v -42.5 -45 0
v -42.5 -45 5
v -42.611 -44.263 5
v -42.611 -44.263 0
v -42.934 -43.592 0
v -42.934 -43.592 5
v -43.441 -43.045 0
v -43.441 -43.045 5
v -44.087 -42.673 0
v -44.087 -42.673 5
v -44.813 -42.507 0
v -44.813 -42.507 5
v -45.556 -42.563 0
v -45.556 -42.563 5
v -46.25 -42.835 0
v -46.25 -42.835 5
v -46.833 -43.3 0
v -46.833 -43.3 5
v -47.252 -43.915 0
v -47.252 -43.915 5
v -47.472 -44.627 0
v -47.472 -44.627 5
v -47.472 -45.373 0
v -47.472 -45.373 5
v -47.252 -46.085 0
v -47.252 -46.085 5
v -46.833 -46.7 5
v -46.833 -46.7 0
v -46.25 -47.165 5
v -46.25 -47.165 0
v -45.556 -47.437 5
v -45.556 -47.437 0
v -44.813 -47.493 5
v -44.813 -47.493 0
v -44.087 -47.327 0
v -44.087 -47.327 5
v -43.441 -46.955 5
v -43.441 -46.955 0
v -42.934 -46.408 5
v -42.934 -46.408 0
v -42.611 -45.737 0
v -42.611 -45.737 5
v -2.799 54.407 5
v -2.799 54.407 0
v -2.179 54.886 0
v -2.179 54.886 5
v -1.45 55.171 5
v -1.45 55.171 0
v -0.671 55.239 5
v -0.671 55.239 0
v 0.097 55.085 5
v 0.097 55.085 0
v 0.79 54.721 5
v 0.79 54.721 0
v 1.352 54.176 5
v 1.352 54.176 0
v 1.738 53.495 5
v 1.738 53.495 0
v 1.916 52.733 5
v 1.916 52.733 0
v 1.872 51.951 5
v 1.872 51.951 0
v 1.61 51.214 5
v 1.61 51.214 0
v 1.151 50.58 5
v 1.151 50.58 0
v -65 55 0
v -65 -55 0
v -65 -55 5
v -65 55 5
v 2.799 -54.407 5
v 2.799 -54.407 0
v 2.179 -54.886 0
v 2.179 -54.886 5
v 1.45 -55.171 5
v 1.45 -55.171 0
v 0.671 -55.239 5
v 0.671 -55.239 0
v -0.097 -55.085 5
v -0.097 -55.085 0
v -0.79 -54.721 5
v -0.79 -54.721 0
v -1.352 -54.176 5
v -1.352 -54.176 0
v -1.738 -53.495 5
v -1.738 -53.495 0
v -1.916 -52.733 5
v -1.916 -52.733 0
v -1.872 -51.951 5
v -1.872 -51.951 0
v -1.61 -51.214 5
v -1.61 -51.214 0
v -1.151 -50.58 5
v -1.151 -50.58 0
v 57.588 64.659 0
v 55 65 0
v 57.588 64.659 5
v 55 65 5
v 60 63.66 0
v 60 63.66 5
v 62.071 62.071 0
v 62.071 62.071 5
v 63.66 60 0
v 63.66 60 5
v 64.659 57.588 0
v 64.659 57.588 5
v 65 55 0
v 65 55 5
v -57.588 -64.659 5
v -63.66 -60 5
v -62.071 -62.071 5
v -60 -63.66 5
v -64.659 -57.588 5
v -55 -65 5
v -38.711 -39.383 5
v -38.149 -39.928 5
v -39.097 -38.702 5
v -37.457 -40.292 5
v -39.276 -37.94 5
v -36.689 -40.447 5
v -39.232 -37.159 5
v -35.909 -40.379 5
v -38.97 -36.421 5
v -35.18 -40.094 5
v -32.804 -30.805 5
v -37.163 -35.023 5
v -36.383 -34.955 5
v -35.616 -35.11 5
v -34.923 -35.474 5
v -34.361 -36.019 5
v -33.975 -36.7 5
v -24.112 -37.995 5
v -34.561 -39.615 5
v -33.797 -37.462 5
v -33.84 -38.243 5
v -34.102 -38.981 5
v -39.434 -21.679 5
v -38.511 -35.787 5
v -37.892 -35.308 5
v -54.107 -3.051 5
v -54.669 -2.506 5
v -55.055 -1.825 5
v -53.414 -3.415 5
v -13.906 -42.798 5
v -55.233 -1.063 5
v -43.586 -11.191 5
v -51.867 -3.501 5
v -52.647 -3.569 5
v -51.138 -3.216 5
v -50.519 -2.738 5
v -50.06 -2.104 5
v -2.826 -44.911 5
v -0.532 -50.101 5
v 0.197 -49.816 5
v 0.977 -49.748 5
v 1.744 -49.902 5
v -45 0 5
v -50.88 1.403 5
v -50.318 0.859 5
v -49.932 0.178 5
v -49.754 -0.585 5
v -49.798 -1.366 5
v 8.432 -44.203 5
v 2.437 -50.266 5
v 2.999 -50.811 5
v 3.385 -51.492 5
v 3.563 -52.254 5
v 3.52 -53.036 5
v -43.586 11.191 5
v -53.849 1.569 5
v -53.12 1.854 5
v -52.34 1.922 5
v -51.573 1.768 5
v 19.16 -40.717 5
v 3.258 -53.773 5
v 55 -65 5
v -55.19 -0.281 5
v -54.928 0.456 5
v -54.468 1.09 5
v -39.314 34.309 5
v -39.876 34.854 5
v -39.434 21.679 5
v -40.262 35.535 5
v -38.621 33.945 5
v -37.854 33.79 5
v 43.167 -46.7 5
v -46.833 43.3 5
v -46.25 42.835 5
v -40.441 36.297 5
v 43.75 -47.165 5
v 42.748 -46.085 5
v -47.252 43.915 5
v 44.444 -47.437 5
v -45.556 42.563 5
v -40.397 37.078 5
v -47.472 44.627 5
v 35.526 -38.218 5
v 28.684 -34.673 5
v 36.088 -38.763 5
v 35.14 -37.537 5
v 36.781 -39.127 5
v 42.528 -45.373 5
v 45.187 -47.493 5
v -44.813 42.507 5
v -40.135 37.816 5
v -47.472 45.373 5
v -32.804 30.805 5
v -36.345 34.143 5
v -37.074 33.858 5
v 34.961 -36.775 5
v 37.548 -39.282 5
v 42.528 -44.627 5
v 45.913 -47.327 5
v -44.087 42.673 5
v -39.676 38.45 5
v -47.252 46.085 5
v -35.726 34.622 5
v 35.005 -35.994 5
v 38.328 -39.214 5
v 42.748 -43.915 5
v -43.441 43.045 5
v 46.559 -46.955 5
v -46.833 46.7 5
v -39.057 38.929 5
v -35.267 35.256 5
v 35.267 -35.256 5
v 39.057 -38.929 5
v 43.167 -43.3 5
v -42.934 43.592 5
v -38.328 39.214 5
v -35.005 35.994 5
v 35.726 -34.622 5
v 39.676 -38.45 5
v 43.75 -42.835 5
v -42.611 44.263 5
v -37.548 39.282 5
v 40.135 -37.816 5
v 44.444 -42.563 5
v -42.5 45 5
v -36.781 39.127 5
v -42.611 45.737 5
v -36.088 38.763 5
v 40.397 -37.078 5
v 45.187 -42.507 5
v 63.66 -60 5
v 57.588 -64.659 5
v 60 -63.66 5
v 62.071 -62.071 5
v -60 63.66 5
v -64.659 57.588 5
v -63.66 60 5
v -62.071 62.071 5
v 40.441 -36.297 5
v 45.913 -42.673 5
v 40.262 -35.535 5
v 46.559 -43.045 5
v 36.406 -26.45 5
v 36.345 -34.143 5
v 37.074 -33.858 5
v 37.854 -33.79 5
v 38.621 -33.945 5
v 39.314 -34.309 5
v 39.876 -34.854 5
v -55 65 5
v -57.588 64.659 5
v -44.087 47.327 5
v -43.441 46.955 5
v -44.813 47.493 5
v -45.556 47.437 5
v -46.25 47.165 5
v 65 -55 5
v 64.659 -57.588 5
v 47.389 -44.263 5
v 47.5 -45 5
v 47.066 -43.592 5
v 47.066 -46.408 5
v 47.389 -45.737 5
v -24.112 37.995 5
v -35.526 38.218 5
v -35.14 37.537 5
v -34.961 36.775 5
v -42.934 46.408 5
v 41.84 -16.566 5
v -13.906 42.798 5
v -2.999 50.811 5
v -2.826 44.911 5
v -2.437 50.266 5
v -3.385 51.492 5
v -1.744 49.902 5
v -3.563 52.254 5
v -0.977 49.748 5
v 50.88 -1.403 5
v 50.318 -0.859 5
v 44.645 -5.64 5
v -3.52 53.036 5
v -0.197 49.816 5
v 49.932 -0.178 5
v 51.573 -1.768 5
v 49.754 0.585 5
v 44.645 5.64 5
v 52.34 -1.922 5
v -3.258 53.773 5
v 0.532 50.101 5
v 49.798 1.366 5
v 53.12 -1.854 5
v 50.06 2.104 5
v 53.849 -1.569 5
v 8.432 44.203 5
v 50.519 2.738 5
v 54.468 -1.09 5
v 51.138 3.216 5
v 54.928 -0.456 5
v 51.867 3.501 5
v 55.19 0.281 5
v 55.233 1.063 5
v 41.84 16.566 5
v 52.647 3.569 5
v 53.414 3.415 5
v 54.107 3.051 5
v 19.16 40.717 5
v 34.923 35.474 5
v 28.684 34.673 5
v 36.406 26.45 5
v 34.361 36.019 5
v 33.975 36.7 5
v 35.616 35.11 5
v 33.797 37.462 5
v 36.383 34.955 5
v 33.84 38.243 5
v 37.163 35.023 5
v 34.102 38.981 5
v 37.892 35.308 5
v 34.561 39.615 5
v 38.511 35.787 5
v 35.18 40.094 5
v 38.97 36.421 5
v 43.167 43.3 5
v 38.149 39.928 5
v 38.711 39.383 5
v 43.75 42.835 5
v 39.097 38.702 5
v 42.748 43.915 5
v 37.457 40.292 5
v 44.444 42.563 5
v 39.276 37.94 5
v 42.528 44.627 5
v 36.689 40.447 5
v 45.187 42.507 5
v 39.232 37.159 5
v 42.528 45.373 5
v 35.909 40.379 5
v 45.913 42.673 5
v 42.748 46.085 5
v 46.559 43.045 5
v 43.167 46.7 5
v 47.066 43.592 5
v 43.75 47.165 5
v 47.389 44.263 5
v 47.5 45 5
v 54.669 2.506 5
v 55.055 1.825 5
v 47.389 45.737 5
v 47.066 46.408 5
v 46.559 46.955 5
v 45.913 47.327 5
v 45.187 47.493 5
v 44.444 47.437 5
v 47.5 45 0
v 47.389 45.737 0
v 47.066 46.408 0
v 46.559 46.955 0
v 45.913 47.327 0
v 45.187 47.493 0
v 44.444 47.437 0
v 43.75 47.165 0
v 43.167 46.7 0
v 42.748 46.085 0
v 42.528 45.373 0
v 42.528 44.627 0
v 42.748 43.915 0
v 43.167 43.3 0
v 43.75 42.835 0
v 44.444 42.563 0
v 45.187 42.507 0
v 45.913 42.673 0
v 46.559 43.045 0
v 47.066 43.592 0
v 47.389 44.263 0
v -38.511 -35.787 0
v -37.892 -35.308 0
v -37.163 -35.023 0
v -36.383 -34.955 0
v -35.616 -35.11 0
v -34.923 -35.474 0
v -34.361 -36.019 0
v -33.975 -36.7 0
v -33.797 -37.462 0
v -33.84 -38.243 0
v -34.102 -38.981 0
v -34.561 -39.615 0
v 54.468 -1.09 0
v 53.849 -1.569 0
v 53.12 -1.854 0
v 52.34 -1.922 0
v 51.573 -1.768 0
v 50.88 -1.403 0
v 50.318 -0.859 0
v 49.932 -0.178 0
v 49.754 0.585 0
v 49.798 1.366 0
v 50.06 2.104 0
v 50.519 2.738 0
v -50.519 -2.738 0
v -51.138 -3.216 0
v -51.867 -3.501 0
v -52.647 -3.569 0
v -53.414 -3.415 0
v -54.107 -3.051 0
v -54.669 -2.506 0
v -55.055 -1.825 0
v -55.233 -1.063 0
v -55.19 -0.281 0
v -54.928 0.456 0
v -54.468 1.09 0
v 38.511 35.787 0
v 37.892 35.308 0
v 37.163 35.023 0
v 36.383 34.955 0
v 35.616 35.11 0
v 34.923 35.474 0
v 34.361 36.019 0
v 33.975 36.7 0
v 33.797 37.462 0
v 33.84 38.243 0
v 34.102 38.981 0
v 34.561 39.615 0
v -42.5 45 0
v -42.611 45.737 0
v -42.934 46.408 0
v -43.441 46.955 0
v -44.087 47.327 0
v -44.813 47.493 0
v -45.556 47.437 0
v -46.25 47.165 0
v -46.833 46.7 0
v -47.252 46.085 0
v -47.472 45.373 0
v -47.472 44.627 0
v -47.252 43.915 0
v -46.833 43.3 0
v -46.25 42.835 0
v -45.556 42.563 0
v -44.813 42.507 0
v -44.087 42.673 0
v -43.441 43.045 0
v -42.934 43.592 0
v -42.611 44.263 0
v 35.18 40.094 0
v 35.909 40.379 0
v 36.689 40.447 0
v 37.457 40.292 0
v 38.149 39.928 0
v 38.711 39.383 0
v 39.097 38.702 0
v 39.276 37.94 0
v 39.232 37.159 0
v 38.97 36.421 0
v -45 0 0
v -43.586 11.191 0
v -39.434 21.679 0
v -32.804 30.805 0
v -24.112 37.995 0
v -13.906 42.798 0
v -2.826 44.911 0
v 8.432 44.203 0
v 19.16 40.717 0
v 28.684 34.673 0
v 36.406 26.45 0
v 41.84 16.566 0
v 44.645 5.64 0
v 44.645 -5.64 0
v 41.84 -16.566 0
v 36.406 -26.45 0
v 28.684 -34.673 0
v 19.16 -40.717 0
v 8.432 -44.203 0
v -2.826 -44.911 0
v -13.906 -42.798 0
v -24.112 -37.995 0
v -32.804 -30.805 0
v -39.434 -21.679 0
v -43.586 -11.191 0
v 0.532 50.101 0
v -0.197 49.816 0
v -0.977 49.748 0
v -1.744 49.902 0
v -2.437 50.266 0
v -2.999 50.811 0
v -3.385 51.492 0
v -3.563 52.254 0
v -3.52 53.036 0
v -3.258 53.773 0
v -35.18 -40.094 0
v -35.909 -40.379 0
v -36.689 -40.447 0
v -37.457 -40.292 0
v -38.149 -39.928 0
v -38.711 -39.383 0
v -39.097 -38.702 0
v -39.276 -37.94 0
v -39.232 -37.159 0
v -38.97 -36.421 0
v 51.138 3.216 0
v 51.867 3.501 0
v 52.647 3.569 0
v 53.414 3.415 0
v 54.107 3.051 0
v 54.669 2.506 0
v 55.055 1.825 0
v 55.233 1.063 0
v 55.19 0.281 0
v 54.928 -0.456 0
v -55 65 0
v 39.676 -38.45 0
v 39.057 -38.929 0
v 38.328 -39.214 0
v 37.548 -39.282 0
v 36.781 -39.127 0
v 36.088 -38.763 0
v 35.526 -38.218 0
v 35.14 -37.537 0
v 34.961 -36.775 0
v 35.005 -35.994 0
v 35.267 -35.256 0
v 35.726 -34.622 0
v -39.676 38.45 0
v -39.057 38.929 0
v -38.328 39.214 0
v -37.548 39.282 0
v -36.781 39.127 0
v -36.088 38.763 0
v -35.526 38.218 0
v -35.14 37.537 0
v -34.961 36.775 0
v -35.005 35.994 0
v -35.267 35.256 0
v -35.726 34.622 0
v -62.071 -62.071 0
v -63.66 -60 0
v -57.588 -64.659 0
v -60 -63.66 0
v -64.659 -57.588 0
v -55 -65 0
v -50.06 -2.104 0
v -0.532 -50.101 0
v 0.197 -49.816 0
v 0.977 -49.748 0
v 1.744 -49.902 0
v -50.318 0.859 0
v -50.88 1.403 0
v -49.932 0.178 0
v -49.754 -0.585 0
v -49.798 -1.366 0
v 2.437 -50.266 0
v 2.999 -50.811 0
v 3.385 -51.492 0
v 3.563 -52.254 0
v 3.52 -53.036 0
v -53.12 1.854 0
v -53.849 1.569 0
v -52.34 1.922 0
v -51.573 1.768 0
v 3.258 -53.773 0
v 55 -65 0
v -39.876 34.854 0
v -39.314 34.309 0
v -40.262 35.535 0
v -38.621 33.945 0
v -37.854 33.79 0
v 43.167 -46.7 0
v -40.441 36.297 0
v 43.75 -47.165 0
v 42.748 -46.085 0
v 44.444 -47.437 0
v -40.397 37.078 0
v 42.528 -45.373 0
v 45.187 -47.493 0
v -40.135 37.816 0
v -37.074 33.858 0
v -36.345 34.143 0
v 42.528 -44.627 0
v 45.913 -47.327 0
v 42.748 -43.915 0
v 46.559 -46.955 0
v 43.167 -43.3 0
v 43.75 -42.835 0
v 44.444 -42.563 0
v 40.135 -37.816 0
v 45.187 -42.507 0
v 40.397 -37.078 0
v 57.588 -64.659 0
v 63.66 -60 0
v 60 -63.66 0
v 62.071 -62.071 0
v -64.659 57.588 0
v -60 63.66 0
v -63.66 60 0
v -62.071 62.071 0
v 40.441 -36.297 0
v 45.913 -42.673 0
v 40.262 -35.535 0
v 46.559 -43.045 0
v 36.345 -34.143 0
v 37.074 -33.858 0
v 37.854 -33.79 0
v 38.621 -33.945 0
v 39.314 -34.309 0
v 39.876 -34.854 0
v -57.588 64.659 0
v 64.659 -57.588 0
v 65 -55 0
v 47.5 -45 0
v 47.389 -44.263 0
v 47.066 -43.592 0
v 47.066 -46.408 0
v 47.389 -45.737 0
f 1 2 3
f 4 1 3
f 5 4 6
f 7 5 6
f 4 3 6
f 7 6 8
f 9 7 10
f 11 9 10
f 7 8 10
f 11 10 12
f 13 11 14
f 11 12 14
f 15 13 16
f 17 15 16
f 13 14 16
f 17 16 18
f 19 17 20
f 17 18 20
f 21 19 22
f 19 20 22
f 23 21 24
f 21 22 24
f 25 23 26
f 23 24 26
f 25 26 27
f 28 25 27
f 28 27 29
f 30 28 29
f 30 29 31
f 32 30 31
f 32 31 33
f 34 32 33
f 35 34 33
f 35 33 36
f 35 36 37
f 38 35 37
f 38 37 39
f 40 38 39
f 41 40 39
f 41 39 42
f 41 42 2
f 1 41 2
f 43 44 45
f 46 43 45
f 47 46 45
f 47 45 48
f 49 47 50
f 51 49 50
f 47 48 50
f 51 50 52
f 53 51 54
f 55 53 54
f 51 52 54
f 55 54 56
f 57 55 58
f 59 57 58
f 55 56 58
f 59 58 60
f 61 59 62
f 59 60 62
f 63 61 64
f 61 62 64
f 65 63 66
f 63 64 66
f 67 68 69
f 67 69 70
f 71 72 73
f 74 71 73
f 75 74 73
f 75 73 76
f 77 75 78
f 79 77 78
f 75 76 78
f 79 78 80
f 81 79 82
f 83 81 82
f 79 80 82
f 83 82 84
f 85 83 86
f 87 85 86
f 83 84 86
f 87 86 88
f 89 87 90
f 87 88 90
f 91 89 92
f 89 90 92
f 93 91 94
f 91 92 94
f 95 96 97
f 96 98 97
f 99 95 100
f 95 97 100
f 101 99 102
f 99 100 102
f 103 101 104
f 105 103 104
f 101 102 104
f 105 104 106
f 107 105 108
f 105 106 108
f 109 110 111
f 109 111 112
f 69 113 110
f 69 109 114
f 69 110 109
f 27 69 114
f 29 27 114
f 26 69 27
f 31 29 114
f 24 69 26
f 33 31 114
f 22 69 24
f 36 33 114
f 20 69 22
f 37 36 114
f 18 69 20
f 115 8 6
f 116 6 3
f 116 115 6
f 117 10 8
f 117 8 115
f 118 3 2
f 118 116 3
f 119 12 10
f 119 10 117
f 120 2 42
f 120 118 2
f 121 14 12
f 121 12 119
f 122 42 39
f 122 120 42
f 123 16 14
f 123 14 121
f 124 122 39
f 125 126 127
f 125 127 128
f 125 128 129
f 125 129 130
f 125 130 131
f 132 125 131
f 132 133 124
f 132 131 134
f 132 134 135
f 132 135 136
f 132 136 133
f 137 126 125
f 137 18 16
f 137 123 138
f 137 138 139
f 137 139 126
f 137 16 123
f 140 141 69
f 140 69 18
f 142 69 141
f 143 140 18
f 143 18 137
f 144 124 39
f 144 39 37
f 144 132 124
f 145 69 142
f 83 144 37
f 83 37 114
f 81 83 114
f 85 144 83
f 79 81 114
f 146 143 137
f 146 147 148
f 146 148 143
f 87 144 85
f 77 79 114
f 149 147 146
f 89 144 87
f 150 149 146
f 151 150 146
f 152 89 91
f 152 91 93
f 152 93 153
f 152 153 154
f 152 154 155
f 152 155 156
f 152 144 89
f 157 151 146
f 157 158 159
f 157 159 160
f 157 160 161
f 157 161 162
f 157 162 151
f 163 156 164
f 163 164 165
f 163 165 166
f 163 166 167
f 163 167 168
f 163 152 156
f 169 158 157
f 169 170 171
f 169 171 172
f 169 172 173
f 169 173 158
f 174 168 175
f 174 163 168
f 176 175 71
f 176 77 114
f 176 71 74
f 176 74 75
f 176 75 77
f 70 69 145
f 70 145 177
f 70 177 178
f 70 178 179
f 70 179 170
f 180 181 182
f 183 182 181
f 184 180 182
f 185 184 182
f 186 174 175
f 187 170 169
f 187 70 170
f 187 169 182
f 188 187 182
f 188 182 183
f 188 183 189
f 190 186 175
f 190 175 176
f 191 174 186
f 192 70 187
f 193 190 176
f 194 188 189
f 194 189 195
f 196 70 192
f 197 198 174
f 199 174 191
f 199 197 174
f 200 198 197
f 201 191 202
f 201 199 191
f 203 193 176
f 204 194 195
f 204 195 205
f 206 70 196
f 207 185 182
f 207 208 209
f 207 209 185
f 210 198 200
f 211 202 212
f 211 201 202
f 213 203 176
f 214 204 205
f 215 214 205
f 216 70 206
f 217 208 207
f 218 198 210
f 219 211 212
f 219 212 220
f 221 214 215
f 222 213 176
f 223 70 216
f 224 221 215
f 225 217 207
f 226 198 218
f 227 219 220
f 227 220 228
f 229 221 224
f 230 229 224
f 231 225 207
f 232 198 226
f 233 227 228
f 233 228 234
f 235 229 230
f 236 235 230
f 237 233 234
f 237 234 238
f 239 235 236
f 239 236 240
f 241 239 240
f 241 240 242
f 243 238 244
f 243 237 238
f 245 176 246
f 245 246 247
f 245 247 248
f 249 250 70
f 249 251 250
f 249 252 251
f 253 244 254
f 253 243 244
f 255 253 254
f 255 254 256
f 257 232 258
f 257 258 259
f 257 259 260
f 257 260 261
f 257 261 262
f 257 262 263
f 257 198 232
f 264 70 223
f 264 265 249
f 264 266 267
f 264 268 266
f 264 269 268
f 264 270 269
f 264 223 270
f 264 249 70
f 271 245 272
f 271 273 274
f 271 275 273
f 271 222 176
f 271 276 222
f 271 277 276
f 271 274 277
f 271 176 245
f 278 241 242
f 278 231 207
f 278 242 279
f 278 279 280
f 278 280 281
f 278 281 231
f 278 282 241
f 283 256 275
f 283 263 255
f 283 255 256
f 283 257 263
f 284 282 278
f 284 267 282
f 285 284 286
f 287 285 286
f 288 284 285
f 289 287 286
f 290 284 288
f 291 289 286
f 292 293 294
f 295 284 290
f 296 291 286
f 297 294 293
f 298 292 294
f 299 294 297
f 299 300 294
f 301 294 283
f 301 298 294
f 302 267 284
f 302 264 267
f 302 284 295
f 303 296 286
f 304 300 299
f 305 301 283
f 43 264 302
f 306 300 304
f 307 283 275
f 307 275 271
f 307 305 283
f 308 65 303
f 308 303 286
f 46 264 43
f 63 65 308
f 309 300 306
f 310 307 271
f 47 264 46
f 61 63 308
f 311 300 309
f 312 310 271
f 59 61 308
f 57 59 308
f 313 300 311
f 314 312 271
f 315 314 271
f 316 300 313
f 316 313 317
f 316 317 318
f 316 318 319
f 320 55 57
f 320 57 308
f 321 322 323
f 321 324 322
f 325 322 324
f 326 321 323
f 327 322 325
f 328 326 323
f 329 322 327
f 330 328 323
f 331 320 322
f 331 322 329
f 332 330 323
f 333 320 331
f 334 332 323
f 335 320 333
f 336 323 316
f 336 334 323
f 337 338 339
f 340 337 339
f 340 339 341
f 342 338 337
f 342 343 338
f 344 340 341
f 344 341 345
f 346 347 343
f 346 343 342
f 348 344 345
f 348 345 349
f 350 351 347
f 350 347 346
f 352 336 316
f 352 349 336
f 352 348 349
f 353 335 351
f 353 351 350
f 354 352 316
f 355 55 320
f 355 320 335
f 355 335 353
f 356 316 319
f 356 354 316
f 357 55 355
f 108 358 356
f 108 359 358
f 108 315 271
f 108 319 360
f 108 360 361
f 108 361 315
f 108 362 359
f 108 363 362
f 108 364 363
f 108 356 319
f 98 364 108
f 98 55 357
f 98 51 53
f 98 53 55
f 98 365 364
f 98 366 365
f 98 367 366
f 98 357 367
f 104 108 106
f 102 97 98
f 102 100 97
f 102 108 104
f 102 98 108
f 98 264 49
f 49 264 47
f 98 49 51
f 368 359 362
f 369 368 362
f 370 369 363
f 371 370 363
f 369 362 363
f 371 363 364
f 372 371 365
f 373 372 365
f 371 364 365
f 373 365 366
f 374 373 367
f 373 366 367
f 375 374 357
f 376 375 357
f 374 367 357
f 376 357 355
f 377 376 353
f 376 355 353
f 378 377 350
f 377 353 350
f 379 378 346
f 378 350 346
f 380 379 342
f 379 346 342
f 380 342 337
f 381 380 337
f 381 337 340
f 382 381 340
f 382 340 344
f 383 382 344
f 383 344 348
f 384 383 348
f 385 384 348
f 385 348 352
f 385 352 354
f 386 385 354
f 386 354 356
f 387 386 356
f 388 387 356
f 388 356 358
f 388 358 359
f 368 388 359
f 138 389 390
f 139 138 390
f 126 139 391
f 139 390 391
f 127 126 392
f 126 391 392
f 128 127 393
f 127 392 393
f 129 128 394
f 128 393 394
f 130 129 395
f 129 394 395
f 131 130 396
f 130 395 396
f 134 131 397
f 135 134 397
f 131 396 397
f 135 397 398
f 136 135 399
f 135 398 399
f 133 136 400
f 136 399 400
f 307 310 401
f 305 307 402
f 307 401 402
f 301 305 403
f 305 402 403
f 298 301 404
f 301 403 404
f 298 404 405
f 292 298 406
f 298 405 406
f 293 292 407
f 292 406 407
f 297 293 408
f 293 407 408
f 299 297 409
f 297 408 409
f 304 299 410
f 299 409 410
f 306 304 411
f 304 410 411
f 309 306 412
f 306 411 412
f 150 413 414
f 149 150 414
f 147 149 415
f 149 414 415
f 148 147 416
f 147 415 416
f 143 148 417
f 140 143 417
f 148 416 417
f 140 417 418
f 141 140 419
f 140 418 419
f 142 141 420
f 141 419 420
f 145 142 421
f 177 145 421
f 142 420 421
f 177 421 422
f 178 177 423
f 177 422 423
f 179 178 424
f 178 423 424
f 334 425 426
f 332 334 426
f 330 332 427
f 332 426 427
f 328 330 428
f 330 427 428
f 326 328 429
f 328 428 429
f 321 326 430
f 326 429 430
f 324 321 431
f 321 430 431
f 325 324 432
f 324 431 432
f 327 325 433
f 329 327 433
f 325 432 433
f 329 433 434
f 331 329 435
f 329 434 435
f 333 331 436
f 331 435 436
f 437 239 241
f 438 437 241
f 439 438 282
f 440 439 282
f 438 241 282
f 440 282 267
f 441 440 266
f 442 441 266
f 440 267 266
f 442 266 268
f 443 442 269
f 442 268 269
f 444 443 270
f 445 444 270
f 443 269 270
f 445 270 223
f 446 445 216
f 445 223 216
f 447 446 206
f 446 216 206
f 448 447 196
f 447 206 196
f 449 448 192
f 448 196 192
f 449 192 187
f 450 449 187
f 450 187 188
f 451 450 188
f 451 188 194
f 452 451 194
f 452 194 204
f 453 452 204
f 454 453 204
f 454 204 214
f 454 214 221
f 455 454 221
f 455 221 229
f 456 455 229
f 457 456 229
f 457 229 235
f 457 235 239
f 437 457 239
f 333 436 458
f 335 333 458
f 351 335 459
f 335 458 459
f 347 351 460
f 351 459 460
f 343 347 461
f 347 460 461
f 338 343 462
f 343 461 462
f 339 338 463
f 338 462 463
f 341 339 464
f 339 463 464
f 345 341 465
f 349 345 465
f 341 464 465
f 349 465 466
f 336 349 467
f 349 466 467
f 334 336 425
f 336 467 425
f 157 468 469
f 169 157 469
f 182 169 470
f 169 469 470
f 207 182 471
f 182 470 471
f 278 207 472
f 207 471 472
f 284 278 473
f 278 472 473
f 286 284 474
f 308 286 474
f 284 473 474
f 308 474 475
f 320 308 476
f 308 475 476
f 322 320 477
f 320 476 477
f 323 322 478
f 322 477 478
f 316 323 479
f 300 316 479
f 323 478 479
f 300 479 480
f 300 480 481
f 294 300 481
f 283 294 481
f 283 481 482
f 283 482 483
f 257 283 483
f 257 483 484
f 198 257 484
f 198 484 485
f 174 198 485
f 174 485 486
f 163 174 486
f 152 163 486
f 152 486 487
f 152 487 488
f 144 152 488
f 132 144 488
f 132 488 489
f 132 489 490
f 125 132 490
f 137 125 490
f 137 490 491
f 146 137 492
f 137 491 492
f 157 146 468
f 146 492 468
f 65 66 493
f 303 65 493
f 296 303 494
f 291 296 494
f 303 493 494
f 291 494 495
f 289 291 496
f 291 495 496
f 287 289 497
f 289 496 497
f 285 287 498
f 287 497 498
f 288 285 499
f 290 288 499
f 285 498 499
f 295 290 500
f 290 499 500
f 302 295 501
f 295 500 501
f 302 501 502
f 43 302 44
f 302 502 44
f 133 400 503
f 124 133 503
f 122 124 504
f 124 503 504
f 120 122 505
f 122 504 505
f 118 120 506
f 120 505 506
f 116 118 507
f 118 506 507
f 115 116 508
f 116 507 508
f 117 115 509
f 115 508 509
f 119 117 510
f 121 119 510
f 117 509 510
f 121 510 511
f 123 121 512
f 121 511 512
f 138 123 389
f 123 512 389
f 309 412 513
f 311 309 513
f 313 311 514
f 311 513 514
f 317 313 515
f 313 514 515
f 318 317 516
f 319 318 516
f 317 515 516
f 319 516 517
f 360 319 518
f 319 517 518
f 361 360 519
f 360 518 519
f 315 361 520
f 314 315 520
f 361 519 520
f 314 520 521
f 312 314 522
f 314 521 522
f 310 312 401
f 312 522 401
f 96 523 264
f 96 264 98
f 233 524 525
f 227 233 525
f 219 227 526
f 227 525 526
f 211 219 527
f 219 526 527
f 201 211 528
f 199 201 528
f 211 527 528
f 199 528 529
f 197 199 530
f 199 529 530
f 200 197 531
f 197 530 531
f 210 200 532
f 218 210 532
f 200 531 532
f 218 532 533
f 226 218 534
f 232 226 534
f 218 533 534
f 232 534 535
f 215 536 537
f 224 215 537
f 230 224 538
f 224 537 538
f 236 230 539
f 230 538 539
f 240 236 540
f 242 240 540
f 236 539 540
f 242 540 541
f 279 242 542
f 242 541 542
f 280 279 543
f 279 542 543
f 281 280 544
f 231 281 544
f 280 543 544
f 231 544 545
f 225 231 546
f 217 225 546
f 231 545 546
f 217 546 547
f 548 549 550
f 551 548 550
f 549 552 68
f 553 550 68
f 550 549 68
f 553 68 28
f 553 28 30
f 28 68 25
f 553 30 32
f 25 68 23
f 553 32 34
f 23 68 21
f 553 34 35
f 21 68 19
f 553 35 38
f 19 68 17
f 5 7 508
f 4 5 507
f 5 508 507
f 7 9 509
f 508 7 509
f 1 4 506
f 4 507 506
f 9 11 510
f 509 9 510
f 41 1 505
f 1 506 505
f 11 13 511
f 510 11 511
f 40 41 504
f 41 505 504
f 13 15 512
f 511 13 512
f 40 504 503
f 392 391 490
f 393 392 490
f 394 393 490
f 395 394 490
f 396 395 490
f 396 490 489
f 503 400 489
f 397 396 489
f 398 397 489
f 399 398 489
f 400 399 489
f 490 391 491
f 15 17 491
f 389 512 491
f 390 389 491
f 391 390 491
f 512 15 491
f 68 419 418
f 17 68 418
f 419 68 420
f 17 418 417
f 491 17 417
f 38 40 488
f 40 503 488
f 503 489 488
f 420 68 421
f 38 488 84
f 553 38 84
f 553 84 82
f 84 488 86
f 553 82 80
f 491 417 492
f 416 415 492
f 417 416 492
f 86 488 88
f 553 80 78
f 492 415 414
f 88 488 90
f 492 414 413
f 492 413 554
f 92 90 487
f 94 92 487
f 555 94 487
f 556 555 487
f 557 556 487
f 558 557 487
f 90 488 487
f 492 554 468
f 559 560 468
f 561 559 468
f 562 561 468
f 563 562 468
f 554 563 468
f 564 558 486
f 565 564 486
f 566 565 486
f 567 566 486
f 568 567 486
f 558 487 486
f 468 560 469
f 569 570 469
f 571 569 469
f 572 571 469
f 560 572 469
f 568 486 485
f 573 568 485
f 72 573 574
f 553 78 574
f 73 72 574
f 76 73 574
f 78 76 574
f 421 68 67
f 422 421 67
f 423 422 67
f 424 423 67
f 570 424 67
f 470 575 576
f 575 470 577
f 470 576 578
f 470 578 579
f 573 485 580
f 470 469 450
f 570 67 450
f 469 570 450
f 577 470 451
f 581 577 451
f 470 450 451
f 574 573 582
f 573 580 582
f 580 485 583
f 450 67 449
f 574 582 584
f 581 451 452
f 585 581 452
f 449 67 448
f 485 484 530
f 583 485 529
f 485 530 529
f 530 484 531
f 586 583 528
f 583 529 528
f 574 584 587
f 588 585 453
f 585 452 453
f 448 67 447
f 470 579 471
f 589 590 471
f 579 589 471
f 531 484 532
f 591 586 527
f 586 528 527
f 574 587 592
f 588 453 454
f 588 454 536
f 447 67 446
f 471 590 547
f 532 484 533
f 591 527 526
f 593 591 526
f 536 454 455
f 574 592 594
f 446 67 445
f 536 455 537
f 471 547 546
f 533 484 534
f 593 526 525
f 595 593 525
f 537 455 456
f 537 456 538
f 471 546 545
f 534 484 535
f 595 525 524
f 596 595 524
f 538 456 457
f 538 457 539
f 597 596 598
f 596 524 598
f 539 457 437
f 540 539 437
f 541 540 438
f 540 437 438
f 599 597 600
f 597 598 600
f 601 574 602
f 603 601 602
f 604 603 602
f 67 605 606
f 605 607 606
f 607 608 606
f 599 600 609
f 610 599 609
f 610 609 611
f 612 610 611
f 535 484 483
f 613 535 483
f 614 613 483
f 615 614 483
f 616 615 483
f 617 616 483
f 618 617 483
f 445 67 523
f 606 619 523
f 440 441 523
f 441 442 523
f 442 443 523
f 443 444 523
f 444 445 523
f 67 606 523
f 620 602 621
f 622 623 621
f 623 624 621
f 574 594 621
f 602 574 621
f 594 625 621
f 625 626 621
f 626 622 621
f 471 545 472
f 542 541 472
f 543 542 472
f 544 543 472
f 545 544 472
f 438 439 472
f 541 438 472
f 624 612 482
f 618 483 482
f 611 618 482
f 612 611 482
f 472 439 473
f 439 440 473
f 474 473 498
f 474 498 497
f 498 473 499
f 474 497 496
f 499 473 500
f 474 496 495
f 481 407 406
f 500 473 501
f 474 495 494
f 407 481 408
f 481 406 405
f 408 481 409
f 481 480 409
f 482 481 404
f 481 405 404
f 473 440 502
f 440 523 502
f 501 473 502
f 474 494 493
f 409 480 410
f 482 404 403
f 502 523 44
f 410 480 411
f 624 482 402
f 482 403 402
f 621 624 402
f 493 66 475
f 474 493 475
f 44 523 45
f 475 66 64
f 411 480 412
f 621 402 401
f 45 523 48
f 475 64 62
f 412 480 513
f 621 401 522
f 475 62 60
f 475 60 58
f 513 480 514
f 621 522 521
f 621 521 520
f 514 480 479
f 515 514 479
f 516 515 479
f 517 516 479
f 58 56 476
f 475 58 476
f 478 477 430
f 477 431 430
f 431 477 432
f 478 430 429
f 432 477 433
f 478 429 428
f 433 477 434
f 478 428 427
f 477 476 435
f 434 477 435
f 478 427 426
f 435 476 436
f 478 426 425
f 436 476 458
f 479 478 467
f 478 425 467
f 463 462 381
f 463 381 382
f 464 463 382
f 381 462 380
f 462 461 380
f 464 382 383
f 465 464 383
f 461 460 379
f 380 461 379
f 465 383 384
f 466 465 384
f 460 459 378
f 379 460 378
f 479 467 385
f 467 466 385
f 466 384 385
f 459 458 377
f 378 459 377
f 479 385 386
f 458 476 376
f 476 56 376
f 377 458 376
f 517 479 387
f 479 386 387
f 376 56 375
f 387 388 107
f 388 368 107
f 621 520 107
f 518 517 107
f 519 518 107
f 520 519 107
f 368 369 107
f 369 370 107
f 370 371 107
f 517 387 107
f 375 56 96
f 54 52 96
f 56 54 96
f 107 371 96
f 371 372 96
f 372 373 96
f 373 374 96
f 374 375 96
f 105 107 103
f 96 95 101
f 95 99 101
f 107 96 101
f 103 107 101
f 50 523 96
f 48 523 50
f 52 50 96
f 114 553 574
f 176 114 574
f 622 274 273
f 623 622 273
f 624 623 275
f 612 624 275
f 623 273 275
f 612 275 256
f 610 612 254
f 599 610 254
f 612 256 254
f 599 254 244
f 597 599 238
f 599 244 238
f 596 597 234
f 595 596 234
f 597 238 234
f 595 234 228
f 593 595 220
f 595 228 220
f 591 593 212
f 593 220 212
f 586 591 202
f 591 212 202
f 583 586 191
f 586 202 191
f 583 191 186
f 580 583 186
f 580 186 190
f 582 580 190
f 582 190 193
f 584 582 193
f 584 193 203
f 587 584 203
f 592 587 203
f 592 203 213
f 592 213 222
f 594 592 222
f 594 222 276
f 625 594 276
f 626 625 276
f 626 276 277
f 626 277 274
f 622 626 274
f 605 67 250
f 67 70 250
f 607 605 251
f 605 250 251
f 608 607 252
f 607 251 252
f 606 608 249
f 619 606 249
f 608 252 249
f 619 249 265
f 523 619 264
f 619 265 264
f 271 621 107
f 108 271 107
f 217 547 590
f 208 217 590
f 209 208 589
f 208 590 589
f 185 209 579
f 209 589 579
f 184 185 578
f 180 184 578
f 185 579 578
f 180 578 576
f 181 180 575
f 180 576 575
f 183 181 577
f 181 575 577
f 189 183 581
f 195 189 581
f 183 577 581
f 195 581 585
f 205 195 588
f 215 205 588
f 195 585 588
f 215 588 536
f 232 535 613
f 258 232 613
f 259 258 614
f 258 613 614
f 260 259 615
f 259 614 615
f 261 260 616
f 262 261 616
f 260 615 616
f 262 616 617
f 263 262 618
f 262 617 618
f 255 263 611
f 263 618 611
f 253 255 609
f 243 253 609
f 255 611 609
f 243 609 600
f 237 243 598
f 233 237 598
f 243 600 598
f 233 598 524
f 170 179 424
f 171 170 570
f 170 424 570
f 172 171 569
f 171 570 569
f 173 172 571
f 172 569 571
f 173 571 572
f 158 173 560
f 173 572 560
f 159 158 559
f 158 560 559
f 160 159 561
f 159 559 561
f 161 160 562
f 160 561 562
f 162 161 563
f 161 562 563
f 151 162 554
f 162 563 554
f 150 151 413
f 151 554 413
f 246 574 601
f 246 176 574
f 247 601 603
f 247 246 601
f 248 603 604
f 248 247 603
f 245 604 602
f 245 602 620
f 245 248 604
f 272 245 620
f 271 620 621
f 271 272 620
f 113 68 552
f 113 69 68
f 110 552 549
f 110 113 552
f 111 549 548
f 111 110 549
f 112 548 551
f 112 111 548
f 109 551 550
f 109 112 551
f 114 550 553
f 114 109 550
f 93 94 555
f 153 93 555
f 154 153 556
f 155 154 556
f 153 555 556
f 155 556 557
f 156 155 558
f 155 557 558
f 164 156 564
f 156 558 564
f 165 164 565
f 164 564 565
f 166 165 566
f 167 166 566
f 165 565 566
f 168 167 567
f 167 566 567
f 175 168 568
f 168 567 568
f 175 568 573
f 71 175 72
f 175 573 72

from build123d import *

# Parameters (mm, degrees)
SKETCH_1_W          = 130
SKETCH_1_H          = 130
EXTRUDE_1_DEPTH     = 5
CUT_EXTRUDE_2_REACH = 94.06
SKETCH_5_R          = 45
FILLET_1_R          = 10
CUT_EXTRUDE_3_DEPTH = 10
SKETCH_7_R          = 2.5
CUT_EXTRUDE_4_DEPTH = 93.059763198


with BuildPart() as part:
    # 草图1 → 凸台-拉伸1 (new body)
    with BuildSketch(Plane.XY):
        Rectangle(SKETCH_1_W, SKETCH_1_H)
    extrude(amount=EXTRUDE_1_DEPTH)

    # 草图5 → 切除-拉伸2 (cut, up to next)
    with BuildSketch(Plane(origin=(0, 0, 0), x_dir=(-1, 0, 0), z_dir=(0, 0, -1)), mode=Mode.PRIVATE) as cut_extrude_2_sk1:
        Circle(SKETCH_5_R)
    cut_extrude_2_tool1 = extrude(cut_extrude_2_sk1.sketch, amount=-CUT_EXTRUDE_2_REACH, mode=Mode.PRIVATE) & part.part
    add(cut_extrude_2_tool1.solids().sort_by_distance((0, 0, 0))[0], mode=Mode.SUBTRACT)

    # 圆角1
    fillet_1_edges = [part.edges().sort_by_distance(p)[0] for p in [
        (65, -65, 2.5),
        (-65, -65, 2.5),
        (-65, 65, 2.5),
        (65, 65, 2.5),
    ]]
    fillet(fillet_1_edges, radius=FILLET_1_R)

    # 草图6 → 切除-拉伸3 (cut)
    with BuildSketch(Plane(origin=(0, 0, 0), x_dir=(-1, 0, 0), z_dir=(0, 0, -1))):
        with BuildLine():
            ThreePointArc((39.675797976, 38.449883679), (35.787189387, 38.510902038), (35.726171029, 34.622293449))
            ThreePointArc((35.726171029, 34.622293449), (39.614779618, 34.56127509), (39.675797976, 38.449883679))
        make_face()
        with BuildLine():
            ThreePointArc((54.468351255, 1.090089298), (50.579742665, 1.151107656), (50.518724307, -2.737500933))
            ThreePointArc((50.518724307, -2.737500933), (54.407332896, -2.798519291), (54.468351255, 1.090089298))
        make_face()
        with BuildLine():
            ThreePointArc((38.510902038, -35.787189387), (34.622293449, -35.726171029), (34.56127509, -39.614779618))
            ThreePointArc((34.56127509, -39.614779618), (38.449883679, -39.675797976), (38.510902038, -35.787189387))
        make_face()
        with BuildLine():
            ThreePointArc((1.151107656, -50.579742665), (-2.737500933, -50.518724307), (-2.798519291, -54.407332896))
            ThreePointArc((-2.798519291, -54.407332896), (1.090089298, -54.468351255), (1.151107656, -50.579742665))
        make_face()
        with BuildLine():
            ThreePointArc((-35.726171029, -34.622293449), (-39.614779618, -34.56127509), (-39.675797976, -38.449883679))
            ThreePointArc((-39.675797976, -38.449883679), (-35.787189387, -38.510902038), (-35.726171029, -34.622293449))
        make_face()
        with BuildLine():
            ThreePointArc((-50.518724307, 2.737500933), (-54.407332896, 2.798519291), (-54.468351255, -1.090089298))
            ThreePointArc((-54.468351255, -1.090089298), (-50.579742665, -1.151107656), (-50.518724307, 2.737500933))
        make_face()
        with BuildLine():
            ThreePointArc((-34.56127509, 39.614779618), (-38.449883679, 39.675797976), (-38.510902038, 35.787189387))
            ThreePointArc((-38.510902038, 35.787189387), (-34.622293449, 35.726171029), (-34.56127509, 39.614779618))
        make_face()
        with BuildLine():
            ThreePointArc((2.798519291, 54.407332896), (-1.090089298, 54.468351255), (-1.151107656, 50.579742665))
            ThreePointArc((-1.151107656, 50.579742665), (2.737500933, 50.518724307), (2.798519291, 54.407332896))
        make_face()
    extrude(amount=-CUT_EXTRUDE_3_DEPTH, mode=Mode.SUBTRACT)

    # 草图7 → 切除-拉伸4 (cut, through all)
    with BuildSketch(Plane.XY.offset(5)):
        with Locations((-45, 45)):
            Circle(SKETCH_7_R)
        with Locations((45, 45)):
            Circle(SKETCH_7_R)
        with Locations((45, -45)):
            Circle(SKETCH_7_R)
        with Locations((-45, -45)):
            Circle(SKETCH_7_R)
    extrude(amount=-CUT_EXTRUDE_4_DEPTH, mode=Mode.SUBTRACT)


solid = part.part
